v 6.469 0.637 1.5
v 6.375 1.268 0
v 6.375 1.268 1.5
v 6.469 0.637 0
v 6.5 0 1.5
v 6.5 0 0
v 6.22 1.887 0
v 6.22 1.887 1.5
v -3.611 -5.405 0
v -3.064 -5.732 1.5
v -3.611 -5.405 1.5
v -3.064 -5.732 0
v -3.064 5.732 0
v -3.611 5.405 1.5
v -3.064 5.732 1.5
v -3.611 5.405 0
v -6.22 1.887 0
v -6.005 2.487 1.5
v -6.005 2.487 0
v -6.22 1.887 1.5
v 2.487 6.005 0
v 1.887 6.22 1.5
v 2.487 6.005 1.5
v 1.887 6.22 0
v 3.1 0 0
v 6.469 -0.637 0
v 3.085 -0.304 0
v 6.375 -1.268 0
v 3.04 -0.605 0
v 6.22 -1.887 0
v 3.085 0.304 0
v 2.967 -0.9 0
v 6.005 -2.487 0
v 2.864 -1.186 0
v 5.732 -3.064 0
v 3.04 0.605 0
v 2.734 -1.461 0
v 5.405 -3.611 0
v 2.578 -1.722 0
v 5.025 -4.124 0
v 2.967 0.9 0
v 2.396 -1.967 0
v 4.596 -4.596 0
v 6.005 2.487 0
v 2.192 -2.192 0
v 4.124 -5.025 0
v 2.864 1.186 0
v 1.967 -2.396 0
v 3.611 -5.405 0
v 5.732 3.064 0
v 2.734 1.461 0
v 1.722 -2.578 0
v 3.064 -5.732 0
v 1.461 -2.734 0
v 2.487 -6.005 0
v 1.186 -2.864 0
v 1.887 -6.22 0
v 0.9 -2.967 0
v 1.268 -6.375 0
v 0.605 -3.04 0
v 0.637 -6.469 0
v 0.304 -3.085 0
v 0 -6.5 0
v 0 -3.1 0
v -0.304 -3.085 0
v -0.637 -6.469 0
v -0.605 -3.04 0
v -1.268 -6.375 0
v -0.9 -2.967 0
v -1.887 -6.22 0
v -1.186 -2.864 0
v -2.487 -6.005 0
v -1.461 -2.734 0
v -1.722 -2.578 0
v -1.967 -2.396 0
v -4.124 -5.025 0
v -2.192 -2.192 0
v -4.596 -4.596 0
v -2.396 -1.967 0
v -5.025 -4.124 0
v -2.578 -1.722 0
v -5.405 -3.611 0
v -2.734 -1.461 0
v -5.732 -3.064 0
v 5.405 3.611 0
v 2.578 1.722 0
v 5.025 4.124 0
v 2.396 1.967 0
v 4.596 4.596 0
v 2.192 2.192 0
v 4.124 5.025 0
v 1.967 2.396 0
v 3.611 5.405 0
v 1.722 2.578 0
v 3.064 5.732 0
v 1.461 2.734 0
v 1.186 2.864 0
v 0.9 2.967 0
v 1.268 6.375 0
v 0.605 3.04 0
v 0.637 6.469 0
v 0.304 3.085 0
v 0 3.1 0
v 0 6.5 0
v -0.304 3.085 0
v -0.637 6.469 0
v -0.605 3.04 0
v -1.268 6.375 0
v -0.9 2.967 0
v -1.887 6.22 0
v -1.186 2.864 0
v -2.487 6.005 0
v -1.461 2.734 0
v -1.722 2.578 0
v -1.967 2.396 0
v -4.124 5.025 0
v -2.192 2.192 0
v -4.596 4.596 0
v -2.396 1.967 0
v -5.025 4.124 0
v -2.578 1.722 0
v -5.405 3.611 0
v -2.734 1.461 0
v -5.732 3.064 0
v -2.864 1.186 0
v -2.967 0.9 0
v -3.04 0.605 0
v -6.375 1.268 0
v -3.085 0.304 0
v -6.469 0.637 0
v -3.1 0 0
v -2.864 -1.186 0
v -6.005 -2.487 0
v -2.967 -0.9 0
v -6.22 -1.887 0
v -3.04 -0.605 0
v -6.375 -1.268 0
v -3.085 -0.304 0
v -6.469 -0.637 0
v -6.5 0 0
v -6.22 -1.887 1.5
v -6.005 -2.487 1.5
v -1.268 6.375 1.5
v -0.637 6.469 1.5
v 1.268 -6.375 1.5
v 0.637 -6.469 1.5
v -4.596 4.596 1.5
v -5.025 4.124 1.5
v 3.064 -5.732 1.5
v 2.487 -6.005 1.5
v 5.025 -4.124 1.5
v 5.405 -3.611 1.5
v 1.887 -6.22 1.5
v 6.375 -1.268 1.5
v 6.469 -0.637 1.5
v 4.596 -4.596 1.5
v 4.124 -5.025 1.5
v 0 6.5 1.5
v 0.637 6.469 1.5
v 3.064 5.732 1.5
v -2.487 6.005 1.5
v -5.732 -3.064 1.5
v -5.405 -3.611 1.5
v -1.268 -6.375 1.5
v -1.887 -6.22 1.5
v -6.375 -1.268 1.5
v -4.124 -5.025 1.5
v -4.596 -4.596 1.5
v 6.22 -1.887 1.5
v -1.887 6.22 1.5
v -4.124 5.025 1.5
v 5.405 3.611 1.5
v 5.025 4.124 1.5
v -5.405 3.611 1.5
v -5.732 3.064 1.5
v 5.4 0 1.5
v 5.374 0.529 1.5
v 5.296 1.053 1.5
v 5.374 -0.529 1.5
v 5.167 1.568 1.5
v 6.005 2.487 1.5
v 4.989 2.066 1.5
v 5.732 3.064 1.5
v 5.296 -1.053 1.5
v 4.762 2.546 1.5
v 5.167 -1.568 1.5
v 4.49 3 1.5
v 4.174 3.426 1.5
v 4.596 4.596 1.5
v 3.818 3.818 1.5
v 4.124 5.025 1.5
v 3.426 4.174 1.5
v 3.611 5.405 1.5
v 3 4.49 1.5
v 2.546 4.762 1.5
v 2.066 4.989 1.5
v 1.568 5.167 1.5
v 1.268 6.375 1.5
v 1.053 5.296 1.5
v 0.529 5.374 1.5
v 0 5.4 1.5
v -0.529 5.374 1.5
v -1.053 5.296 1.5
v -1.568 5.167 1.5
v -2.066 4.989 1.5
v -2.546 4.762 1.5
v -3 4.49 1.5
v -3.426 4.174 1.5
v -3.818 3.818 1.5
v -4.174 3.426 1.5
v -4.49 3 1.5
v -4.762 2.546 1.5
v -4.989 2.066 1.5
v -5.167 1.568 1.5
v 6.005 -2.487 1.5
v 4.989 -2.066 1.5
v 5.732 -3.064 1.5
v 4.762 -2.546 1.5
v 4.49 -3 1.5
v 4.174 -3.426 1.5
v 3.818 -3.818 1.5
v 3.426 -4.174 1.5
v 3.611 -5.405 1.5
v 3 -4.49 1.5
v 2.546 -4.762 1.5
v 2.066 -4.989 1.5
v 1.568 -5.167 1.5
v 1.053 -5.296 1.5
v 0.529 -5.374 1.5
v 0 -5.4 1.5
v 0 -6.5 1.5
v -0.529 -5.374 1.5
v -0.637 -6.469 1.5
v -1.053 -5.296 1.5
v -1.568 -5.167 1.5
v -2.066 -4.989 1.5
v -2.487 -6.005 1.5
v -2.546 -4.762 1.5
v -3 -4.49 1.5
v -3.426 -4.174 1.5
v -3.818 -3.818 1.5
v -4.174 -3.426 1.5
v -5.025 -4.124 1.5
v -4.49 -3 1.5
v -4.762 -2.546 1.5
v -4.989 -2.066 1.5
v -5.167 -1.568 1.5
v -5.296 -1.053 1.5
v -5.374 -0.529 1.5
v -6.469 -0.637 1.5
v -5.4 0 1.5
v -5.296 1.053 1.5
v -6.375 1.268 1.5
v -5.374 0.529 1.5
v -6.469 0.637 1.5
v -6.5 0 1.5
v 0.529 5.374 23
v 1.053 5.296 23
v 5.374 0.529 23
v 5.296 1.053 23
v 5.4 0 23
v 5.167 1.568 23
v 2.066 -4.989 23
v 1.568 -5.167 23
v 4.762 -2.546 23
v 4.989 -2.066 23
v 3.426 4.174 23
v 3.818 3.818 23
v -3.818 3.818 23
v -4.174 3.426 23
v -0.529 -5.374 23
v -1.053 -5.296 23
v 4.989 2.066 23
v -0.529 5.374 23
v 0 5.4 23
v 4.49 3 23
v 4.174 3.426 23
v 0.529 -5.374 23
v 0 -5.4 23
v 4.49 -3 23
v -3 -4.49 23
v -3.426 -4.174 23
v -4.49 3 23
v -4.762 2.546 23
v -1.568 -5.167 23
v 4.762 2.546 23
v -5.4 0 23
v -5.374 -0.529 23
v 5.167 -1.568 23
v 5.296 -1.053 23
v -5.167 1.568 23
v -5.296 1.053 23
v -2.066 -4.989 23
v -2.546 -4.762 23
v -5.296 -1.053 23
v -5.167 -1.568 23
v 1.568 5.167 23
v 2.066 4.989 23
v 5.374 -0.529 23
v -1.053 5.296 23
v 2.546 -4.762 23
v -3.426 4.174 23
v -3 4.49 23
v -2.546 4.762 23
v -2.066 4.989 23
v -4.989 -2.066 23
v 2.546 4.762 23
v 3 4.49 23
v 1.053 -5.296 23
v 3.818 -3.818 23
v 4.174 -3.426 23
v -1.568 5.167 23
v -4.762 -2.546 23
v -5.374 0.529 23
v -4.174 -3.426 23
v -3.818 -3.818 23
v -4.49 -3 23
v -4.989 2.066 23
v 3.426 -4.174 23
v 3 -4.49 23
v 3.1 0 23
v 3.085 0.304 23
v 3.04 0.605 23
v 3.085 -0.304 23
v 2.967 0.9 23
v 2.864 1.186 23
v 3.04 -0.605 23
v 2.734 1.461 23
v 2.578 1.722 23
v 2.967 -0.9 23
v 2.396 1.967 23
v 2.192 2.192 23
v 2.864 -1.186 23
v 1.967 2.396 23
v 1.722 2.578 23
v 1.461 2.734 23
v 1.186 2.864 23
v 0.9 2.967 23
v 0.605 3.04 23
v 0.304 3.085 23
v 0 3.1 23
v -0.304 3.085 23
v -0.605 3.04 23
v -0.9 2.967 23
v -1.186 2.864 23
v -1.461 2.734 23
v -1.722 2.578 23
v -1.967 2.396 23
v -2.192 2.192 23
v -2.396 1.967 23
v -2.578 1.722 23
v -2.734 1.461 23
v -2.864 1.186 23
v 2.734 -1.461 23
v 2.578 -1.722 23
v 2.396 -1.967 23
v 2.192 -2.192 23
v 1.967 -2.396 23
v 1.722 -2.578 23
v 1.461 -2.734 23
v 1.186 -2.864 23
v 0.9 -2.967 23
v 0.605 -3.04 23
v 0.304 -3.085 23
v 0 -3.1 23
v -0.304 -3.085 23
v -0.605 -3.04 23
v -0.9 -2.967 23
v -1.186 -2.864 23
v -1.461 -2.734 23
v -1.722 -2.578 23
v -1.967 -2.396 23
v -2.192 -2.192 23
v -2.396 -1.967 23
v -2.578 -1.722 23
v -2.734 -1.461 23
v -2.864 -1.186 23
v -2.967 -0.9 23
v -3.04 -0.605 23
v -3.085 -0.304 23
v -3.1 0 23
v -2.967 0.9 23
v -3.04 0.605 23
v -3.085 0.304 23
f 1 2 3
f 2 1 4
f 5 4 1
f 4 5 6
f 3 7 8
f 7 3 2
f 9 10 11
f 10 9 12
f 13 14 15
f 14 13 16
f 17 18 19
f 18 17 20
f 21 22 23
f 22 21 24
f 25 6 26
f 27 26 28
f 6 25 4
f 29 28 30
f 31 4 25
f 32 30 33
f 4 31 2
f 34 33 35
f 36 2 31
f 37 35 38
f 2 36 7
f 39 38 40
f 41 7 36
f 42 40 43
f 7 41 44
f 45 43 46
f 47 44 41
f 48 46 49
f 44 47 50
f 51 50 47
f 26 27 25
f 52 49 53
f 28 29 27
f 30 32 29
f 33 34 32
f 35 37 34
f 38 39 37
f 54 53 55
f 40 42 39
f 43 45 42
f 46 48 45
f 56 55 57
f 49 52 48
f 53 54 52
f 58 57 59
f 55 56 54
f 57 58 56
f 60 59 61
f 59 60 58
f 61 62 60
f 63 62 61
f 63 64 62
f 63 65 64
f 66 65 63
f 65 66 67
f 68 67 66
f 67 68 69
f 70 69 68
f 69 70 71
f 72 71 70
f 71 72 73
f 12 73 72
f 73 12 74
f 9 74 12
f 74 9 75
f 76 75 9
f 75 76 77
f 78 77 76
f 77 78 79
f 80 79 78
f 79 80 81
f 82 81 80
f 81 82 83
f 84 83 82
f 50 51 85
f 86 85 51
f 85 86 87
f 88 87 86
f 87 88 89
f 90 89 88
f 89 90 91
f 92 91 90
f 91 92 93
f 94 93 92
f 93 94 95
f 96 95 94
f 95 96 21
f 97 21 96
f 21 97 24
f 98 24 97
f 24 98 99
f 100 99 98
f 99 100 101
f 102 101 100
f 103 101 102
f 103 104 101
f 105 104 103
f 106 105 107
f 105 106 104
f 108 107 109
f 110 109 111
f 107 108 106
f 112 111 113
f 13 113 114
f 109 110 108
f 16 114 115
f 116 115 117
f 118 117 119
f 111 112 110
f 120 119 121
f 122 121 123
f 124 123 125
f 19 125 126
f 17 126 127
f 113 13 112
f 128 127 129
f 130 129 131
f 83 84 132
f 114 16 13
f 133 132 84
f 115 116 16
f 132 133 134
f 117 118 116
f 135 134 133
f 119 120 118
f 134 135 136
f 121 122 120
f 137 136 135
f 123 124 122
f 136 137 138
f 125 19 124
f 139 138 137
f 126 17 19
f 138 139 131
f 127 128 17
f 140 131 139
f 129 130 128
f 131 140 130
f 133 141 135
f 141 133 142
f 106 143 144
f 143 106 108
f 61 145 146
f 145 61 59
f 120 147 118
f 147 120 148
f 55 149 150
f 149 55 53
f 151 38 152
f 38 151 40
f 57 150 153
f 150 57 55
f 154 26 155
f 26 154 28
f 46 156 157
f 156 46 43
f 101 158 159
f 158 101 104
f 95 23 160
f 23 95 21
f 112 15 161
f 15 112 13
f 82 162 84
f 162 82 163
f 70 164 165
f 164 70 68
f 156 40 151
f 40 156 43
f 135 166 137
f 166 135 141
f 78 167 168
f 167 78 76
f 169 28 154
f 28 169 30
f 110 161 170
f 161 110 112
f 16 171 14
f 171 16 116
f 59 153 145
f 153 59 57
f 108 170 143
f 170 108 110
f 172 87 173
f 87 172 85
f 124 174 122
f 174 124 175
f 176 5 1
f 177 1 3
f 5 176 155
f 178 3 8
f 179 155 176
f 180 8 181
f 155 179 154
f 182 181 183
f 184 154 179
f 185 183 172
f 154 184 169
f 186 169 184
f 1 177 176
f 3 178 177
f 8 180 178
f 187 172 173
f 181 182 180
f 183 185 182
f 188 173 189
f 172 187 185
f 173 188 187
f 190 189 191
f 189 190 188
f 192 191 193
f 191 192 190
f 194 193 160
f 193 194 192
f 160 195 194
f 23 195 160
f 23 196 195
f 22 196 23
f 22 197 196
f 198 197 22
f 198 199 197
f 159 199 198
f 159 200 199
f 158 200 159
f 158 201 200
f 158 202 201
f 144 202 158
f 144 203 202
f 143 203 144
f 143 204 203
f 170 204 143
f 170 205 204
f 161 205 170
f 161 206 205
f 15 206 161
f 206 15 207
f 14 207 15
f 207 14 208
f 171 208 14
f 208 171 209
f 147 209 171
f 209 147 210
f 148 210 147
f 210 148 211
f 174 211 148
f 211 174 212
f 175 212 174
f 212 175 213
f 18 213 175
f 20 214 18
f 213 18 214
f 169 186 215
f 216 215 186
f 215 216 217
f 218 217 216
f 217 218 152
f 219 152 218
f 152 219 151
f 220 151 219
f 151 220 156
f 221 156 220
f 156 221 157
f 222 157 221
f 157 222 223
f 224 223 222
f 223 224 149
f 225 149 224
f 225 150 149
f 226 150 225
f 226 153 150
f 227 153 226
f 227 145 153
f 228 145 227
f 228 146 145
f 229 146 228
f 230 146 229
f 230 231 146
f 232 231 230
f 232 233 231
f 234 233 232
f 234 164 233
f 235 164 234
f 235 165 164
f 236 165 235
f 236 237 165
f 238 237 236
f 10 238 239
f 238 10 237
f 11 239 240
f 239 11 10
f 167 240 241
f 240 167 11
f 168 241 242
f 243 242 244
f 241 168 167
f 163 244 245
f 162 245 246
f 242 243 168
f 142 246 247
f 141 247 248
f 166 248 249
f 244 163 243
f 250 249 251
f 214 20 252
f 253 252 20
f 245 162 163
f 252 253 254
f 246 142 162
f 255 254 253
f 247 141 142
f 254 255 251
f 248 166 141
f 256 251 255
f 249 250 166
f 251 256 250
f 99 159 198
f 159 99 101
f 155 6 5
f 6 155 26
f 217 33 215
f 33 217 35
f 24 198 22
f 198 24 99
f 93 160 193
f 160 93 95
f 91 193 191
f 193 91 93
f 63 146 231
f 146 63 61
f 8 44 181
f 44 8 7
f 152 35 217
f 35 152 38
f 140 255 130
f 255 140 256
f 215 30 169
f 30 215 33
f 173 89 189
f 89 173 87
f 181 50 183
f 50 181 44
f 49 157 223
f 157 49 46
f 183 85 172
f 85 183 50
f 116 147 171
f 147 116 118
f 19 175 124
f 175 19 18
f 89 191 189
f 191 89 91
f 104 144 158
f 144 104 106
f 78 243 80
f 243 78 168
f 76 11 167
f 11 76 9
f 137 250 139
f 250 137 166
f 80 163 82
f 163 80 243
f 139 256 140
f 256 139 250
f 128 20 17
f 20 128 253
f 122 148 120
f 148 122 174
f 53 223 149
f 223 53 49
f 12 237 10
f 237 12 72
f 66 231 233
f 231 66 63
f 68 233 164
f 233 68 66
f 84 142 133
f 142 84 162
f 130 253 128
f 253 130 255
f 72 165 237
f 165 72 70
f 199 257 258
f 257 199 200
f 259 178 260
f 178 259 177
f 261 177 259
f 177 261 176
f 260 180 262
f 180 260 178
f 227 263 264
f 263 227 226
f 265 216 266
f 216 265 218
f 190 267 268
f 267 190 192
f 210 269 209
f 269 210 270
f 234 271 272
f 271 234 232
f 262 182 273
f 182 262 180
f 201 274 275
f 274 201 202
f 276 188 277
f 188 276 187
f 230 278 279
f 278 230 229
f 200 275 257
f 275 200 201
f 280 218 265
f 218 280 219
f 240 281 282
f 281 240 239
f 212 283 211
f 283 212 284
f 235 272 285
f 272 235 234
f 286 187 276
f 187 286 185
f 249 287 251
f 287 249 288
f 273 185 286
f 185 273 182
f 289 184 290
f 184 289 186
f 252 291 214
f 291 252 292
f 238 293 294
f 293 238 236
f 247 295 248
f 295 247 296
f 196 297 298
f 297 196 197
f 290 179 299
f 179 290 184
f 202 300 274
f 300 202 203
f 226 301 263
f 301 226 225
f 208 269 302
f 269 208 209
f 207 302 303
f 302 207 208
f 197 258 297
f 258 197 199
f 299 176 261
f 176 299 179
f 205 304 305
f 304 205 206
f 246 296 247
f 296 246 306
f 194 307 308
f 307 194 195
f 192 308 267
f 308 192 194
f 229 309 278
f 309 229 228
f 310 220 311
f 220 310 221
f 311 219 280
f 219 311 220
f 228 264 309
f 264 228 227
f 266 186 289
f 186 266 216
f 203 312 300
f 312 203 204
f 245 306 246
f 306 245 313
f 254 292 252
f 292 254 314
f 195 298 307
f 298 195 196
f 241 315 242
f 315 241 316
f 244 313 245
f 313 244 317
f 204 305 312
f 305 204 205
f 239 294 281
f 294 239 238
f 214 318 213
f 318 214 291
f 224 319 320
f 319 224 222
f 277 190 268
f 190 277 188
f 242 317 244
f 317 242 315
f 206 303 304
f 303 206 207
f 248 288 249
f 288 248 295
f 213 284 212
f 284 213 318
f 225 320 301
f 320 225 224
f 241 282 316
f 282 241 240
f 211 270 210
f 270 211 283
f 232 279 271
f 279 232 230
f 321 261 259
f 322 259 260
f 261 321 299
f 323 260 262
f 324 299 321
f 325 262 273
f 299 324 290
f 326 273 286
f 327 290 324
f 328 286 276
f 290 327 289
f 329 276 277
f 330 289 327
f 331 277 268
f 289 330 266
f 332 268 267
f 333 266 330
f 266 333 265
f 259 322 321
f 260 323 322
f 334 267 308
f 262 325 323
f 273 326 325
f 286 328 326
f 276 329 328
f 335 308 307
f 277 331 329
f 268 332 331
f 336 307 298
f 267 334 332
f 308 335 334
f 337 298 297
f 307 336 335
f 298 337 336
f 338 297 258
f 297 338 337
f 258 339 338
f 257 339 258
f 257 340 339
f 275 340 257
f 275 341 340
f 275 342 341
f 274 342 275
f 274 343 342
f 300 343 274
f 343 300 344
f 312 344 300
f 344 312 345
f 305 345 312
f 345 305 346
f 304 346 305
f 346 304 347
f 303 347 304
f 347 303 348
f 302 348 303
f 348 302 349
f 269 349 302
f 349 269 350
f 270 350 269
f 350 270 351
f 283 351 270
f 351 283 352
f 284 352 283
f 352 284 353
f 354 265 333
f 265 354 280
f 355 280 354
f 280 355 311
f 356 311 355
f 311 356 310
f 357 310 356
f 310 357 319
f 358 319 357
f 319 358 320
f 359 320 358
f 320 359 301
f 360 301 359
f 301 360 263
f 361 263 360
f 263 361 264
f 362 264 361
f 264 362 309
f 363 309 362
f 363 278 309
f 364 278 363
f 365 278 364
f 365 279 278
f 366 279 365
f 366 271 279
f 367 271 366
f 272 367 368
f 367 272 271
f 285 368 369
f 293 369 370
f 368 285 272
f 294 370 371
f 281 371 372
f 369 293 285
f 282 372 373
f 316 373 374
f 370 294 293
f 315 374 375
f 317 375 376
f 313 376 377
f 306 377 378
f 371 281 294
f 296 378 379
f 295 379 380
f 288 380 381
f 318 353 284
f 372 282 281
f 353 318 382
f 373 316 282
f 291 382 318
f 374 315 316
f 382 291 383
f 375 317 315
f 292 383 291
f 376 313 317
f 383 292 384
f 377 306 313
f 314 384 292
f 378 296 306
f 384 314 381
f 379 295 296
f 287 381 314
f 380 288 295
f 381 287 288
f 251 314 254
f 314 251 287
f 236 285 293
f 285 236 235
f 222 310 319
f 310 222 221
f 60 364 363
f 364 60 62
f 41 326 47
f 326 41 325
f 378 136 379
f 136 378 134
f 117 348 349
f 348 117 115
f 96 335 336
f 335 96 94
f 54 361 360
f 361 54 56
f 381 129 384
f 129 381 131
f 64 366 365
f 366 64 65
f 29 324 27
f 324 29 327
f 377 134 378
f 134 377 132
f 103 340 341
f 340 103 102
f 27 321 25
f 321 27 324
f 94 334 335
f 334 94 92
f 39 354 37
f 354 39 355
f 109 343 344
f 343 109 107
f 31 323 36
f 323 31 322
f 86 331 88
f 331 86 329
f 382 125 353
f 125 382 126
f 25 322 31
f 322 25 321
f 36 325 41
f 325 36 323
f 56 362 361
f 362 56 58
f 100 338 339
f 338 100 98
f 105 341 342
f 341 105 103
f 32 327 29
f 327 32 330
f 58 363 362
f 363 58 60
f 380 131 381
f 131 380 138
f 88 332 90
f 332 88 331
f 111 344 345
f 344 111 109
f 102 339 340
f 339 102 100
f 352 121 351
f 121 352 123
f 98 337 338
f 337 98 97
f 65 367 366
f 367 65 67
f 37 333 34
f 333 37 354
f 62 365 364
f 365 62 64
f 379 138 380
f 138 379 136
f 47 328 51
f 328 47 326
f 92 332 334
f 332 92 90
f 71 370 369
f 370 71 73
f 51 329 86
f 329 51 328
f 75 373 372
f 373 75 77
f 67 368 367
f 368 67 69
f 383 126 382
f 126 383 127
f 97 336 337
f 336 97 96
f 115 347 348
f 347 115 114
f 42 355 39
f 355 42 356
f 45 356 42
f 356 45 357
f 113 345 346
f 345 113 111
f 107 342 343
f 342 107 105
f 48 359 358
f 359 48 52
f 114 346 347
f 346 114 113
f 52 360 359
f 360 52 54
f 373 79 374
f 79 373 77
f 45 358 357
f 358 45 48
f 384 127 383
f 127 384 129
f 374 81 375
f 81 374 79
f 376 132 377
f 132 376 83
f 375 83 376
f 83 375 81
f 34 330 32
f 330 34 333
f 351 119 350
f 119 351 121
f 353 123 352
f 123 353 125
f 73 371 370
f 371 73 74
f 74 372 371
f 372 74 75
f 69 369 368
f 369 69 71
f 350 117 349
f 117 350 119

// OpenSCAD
// PCR tube adapter sleeve - fits 0.2 mL tubes into 1.5 mL rack holes
// Print orientation: collar on bed (z = 0), sleeve body rises to z = 21.5

$fn = 64;

// --- Dimensions (mm) ---
tube_od        = 10.8;   // sleeve outer diameter
collar_d       = 13;     // collar diameter
collar_h       = 1.5;    // collar thickness
sleeve_h       = 21.5;   // total height of sleeve body from top of collar
bore_d         = 6.2;    // through-bore diameter
eps            = 0.5;    // cutter overshoot past faces

total_h = sleeve_h + collar_h;  // 23 mm overall height

difference() {
    union() {
        // Collar (z = 0 to 1.5)
        cylinder(d = collar_d, h = collar_h);
        // Sleeve body (z = 1.5 to 21.5)
        translate([0, 0, collar_h])
            cylinder(d = tube_od, h = sleeve_h);
    }
    // Full-length bore, open at both ends
    translate([0, 0, -eps])
        cylinder(d = bore_d, h = total_h + 2 * eps);
}
